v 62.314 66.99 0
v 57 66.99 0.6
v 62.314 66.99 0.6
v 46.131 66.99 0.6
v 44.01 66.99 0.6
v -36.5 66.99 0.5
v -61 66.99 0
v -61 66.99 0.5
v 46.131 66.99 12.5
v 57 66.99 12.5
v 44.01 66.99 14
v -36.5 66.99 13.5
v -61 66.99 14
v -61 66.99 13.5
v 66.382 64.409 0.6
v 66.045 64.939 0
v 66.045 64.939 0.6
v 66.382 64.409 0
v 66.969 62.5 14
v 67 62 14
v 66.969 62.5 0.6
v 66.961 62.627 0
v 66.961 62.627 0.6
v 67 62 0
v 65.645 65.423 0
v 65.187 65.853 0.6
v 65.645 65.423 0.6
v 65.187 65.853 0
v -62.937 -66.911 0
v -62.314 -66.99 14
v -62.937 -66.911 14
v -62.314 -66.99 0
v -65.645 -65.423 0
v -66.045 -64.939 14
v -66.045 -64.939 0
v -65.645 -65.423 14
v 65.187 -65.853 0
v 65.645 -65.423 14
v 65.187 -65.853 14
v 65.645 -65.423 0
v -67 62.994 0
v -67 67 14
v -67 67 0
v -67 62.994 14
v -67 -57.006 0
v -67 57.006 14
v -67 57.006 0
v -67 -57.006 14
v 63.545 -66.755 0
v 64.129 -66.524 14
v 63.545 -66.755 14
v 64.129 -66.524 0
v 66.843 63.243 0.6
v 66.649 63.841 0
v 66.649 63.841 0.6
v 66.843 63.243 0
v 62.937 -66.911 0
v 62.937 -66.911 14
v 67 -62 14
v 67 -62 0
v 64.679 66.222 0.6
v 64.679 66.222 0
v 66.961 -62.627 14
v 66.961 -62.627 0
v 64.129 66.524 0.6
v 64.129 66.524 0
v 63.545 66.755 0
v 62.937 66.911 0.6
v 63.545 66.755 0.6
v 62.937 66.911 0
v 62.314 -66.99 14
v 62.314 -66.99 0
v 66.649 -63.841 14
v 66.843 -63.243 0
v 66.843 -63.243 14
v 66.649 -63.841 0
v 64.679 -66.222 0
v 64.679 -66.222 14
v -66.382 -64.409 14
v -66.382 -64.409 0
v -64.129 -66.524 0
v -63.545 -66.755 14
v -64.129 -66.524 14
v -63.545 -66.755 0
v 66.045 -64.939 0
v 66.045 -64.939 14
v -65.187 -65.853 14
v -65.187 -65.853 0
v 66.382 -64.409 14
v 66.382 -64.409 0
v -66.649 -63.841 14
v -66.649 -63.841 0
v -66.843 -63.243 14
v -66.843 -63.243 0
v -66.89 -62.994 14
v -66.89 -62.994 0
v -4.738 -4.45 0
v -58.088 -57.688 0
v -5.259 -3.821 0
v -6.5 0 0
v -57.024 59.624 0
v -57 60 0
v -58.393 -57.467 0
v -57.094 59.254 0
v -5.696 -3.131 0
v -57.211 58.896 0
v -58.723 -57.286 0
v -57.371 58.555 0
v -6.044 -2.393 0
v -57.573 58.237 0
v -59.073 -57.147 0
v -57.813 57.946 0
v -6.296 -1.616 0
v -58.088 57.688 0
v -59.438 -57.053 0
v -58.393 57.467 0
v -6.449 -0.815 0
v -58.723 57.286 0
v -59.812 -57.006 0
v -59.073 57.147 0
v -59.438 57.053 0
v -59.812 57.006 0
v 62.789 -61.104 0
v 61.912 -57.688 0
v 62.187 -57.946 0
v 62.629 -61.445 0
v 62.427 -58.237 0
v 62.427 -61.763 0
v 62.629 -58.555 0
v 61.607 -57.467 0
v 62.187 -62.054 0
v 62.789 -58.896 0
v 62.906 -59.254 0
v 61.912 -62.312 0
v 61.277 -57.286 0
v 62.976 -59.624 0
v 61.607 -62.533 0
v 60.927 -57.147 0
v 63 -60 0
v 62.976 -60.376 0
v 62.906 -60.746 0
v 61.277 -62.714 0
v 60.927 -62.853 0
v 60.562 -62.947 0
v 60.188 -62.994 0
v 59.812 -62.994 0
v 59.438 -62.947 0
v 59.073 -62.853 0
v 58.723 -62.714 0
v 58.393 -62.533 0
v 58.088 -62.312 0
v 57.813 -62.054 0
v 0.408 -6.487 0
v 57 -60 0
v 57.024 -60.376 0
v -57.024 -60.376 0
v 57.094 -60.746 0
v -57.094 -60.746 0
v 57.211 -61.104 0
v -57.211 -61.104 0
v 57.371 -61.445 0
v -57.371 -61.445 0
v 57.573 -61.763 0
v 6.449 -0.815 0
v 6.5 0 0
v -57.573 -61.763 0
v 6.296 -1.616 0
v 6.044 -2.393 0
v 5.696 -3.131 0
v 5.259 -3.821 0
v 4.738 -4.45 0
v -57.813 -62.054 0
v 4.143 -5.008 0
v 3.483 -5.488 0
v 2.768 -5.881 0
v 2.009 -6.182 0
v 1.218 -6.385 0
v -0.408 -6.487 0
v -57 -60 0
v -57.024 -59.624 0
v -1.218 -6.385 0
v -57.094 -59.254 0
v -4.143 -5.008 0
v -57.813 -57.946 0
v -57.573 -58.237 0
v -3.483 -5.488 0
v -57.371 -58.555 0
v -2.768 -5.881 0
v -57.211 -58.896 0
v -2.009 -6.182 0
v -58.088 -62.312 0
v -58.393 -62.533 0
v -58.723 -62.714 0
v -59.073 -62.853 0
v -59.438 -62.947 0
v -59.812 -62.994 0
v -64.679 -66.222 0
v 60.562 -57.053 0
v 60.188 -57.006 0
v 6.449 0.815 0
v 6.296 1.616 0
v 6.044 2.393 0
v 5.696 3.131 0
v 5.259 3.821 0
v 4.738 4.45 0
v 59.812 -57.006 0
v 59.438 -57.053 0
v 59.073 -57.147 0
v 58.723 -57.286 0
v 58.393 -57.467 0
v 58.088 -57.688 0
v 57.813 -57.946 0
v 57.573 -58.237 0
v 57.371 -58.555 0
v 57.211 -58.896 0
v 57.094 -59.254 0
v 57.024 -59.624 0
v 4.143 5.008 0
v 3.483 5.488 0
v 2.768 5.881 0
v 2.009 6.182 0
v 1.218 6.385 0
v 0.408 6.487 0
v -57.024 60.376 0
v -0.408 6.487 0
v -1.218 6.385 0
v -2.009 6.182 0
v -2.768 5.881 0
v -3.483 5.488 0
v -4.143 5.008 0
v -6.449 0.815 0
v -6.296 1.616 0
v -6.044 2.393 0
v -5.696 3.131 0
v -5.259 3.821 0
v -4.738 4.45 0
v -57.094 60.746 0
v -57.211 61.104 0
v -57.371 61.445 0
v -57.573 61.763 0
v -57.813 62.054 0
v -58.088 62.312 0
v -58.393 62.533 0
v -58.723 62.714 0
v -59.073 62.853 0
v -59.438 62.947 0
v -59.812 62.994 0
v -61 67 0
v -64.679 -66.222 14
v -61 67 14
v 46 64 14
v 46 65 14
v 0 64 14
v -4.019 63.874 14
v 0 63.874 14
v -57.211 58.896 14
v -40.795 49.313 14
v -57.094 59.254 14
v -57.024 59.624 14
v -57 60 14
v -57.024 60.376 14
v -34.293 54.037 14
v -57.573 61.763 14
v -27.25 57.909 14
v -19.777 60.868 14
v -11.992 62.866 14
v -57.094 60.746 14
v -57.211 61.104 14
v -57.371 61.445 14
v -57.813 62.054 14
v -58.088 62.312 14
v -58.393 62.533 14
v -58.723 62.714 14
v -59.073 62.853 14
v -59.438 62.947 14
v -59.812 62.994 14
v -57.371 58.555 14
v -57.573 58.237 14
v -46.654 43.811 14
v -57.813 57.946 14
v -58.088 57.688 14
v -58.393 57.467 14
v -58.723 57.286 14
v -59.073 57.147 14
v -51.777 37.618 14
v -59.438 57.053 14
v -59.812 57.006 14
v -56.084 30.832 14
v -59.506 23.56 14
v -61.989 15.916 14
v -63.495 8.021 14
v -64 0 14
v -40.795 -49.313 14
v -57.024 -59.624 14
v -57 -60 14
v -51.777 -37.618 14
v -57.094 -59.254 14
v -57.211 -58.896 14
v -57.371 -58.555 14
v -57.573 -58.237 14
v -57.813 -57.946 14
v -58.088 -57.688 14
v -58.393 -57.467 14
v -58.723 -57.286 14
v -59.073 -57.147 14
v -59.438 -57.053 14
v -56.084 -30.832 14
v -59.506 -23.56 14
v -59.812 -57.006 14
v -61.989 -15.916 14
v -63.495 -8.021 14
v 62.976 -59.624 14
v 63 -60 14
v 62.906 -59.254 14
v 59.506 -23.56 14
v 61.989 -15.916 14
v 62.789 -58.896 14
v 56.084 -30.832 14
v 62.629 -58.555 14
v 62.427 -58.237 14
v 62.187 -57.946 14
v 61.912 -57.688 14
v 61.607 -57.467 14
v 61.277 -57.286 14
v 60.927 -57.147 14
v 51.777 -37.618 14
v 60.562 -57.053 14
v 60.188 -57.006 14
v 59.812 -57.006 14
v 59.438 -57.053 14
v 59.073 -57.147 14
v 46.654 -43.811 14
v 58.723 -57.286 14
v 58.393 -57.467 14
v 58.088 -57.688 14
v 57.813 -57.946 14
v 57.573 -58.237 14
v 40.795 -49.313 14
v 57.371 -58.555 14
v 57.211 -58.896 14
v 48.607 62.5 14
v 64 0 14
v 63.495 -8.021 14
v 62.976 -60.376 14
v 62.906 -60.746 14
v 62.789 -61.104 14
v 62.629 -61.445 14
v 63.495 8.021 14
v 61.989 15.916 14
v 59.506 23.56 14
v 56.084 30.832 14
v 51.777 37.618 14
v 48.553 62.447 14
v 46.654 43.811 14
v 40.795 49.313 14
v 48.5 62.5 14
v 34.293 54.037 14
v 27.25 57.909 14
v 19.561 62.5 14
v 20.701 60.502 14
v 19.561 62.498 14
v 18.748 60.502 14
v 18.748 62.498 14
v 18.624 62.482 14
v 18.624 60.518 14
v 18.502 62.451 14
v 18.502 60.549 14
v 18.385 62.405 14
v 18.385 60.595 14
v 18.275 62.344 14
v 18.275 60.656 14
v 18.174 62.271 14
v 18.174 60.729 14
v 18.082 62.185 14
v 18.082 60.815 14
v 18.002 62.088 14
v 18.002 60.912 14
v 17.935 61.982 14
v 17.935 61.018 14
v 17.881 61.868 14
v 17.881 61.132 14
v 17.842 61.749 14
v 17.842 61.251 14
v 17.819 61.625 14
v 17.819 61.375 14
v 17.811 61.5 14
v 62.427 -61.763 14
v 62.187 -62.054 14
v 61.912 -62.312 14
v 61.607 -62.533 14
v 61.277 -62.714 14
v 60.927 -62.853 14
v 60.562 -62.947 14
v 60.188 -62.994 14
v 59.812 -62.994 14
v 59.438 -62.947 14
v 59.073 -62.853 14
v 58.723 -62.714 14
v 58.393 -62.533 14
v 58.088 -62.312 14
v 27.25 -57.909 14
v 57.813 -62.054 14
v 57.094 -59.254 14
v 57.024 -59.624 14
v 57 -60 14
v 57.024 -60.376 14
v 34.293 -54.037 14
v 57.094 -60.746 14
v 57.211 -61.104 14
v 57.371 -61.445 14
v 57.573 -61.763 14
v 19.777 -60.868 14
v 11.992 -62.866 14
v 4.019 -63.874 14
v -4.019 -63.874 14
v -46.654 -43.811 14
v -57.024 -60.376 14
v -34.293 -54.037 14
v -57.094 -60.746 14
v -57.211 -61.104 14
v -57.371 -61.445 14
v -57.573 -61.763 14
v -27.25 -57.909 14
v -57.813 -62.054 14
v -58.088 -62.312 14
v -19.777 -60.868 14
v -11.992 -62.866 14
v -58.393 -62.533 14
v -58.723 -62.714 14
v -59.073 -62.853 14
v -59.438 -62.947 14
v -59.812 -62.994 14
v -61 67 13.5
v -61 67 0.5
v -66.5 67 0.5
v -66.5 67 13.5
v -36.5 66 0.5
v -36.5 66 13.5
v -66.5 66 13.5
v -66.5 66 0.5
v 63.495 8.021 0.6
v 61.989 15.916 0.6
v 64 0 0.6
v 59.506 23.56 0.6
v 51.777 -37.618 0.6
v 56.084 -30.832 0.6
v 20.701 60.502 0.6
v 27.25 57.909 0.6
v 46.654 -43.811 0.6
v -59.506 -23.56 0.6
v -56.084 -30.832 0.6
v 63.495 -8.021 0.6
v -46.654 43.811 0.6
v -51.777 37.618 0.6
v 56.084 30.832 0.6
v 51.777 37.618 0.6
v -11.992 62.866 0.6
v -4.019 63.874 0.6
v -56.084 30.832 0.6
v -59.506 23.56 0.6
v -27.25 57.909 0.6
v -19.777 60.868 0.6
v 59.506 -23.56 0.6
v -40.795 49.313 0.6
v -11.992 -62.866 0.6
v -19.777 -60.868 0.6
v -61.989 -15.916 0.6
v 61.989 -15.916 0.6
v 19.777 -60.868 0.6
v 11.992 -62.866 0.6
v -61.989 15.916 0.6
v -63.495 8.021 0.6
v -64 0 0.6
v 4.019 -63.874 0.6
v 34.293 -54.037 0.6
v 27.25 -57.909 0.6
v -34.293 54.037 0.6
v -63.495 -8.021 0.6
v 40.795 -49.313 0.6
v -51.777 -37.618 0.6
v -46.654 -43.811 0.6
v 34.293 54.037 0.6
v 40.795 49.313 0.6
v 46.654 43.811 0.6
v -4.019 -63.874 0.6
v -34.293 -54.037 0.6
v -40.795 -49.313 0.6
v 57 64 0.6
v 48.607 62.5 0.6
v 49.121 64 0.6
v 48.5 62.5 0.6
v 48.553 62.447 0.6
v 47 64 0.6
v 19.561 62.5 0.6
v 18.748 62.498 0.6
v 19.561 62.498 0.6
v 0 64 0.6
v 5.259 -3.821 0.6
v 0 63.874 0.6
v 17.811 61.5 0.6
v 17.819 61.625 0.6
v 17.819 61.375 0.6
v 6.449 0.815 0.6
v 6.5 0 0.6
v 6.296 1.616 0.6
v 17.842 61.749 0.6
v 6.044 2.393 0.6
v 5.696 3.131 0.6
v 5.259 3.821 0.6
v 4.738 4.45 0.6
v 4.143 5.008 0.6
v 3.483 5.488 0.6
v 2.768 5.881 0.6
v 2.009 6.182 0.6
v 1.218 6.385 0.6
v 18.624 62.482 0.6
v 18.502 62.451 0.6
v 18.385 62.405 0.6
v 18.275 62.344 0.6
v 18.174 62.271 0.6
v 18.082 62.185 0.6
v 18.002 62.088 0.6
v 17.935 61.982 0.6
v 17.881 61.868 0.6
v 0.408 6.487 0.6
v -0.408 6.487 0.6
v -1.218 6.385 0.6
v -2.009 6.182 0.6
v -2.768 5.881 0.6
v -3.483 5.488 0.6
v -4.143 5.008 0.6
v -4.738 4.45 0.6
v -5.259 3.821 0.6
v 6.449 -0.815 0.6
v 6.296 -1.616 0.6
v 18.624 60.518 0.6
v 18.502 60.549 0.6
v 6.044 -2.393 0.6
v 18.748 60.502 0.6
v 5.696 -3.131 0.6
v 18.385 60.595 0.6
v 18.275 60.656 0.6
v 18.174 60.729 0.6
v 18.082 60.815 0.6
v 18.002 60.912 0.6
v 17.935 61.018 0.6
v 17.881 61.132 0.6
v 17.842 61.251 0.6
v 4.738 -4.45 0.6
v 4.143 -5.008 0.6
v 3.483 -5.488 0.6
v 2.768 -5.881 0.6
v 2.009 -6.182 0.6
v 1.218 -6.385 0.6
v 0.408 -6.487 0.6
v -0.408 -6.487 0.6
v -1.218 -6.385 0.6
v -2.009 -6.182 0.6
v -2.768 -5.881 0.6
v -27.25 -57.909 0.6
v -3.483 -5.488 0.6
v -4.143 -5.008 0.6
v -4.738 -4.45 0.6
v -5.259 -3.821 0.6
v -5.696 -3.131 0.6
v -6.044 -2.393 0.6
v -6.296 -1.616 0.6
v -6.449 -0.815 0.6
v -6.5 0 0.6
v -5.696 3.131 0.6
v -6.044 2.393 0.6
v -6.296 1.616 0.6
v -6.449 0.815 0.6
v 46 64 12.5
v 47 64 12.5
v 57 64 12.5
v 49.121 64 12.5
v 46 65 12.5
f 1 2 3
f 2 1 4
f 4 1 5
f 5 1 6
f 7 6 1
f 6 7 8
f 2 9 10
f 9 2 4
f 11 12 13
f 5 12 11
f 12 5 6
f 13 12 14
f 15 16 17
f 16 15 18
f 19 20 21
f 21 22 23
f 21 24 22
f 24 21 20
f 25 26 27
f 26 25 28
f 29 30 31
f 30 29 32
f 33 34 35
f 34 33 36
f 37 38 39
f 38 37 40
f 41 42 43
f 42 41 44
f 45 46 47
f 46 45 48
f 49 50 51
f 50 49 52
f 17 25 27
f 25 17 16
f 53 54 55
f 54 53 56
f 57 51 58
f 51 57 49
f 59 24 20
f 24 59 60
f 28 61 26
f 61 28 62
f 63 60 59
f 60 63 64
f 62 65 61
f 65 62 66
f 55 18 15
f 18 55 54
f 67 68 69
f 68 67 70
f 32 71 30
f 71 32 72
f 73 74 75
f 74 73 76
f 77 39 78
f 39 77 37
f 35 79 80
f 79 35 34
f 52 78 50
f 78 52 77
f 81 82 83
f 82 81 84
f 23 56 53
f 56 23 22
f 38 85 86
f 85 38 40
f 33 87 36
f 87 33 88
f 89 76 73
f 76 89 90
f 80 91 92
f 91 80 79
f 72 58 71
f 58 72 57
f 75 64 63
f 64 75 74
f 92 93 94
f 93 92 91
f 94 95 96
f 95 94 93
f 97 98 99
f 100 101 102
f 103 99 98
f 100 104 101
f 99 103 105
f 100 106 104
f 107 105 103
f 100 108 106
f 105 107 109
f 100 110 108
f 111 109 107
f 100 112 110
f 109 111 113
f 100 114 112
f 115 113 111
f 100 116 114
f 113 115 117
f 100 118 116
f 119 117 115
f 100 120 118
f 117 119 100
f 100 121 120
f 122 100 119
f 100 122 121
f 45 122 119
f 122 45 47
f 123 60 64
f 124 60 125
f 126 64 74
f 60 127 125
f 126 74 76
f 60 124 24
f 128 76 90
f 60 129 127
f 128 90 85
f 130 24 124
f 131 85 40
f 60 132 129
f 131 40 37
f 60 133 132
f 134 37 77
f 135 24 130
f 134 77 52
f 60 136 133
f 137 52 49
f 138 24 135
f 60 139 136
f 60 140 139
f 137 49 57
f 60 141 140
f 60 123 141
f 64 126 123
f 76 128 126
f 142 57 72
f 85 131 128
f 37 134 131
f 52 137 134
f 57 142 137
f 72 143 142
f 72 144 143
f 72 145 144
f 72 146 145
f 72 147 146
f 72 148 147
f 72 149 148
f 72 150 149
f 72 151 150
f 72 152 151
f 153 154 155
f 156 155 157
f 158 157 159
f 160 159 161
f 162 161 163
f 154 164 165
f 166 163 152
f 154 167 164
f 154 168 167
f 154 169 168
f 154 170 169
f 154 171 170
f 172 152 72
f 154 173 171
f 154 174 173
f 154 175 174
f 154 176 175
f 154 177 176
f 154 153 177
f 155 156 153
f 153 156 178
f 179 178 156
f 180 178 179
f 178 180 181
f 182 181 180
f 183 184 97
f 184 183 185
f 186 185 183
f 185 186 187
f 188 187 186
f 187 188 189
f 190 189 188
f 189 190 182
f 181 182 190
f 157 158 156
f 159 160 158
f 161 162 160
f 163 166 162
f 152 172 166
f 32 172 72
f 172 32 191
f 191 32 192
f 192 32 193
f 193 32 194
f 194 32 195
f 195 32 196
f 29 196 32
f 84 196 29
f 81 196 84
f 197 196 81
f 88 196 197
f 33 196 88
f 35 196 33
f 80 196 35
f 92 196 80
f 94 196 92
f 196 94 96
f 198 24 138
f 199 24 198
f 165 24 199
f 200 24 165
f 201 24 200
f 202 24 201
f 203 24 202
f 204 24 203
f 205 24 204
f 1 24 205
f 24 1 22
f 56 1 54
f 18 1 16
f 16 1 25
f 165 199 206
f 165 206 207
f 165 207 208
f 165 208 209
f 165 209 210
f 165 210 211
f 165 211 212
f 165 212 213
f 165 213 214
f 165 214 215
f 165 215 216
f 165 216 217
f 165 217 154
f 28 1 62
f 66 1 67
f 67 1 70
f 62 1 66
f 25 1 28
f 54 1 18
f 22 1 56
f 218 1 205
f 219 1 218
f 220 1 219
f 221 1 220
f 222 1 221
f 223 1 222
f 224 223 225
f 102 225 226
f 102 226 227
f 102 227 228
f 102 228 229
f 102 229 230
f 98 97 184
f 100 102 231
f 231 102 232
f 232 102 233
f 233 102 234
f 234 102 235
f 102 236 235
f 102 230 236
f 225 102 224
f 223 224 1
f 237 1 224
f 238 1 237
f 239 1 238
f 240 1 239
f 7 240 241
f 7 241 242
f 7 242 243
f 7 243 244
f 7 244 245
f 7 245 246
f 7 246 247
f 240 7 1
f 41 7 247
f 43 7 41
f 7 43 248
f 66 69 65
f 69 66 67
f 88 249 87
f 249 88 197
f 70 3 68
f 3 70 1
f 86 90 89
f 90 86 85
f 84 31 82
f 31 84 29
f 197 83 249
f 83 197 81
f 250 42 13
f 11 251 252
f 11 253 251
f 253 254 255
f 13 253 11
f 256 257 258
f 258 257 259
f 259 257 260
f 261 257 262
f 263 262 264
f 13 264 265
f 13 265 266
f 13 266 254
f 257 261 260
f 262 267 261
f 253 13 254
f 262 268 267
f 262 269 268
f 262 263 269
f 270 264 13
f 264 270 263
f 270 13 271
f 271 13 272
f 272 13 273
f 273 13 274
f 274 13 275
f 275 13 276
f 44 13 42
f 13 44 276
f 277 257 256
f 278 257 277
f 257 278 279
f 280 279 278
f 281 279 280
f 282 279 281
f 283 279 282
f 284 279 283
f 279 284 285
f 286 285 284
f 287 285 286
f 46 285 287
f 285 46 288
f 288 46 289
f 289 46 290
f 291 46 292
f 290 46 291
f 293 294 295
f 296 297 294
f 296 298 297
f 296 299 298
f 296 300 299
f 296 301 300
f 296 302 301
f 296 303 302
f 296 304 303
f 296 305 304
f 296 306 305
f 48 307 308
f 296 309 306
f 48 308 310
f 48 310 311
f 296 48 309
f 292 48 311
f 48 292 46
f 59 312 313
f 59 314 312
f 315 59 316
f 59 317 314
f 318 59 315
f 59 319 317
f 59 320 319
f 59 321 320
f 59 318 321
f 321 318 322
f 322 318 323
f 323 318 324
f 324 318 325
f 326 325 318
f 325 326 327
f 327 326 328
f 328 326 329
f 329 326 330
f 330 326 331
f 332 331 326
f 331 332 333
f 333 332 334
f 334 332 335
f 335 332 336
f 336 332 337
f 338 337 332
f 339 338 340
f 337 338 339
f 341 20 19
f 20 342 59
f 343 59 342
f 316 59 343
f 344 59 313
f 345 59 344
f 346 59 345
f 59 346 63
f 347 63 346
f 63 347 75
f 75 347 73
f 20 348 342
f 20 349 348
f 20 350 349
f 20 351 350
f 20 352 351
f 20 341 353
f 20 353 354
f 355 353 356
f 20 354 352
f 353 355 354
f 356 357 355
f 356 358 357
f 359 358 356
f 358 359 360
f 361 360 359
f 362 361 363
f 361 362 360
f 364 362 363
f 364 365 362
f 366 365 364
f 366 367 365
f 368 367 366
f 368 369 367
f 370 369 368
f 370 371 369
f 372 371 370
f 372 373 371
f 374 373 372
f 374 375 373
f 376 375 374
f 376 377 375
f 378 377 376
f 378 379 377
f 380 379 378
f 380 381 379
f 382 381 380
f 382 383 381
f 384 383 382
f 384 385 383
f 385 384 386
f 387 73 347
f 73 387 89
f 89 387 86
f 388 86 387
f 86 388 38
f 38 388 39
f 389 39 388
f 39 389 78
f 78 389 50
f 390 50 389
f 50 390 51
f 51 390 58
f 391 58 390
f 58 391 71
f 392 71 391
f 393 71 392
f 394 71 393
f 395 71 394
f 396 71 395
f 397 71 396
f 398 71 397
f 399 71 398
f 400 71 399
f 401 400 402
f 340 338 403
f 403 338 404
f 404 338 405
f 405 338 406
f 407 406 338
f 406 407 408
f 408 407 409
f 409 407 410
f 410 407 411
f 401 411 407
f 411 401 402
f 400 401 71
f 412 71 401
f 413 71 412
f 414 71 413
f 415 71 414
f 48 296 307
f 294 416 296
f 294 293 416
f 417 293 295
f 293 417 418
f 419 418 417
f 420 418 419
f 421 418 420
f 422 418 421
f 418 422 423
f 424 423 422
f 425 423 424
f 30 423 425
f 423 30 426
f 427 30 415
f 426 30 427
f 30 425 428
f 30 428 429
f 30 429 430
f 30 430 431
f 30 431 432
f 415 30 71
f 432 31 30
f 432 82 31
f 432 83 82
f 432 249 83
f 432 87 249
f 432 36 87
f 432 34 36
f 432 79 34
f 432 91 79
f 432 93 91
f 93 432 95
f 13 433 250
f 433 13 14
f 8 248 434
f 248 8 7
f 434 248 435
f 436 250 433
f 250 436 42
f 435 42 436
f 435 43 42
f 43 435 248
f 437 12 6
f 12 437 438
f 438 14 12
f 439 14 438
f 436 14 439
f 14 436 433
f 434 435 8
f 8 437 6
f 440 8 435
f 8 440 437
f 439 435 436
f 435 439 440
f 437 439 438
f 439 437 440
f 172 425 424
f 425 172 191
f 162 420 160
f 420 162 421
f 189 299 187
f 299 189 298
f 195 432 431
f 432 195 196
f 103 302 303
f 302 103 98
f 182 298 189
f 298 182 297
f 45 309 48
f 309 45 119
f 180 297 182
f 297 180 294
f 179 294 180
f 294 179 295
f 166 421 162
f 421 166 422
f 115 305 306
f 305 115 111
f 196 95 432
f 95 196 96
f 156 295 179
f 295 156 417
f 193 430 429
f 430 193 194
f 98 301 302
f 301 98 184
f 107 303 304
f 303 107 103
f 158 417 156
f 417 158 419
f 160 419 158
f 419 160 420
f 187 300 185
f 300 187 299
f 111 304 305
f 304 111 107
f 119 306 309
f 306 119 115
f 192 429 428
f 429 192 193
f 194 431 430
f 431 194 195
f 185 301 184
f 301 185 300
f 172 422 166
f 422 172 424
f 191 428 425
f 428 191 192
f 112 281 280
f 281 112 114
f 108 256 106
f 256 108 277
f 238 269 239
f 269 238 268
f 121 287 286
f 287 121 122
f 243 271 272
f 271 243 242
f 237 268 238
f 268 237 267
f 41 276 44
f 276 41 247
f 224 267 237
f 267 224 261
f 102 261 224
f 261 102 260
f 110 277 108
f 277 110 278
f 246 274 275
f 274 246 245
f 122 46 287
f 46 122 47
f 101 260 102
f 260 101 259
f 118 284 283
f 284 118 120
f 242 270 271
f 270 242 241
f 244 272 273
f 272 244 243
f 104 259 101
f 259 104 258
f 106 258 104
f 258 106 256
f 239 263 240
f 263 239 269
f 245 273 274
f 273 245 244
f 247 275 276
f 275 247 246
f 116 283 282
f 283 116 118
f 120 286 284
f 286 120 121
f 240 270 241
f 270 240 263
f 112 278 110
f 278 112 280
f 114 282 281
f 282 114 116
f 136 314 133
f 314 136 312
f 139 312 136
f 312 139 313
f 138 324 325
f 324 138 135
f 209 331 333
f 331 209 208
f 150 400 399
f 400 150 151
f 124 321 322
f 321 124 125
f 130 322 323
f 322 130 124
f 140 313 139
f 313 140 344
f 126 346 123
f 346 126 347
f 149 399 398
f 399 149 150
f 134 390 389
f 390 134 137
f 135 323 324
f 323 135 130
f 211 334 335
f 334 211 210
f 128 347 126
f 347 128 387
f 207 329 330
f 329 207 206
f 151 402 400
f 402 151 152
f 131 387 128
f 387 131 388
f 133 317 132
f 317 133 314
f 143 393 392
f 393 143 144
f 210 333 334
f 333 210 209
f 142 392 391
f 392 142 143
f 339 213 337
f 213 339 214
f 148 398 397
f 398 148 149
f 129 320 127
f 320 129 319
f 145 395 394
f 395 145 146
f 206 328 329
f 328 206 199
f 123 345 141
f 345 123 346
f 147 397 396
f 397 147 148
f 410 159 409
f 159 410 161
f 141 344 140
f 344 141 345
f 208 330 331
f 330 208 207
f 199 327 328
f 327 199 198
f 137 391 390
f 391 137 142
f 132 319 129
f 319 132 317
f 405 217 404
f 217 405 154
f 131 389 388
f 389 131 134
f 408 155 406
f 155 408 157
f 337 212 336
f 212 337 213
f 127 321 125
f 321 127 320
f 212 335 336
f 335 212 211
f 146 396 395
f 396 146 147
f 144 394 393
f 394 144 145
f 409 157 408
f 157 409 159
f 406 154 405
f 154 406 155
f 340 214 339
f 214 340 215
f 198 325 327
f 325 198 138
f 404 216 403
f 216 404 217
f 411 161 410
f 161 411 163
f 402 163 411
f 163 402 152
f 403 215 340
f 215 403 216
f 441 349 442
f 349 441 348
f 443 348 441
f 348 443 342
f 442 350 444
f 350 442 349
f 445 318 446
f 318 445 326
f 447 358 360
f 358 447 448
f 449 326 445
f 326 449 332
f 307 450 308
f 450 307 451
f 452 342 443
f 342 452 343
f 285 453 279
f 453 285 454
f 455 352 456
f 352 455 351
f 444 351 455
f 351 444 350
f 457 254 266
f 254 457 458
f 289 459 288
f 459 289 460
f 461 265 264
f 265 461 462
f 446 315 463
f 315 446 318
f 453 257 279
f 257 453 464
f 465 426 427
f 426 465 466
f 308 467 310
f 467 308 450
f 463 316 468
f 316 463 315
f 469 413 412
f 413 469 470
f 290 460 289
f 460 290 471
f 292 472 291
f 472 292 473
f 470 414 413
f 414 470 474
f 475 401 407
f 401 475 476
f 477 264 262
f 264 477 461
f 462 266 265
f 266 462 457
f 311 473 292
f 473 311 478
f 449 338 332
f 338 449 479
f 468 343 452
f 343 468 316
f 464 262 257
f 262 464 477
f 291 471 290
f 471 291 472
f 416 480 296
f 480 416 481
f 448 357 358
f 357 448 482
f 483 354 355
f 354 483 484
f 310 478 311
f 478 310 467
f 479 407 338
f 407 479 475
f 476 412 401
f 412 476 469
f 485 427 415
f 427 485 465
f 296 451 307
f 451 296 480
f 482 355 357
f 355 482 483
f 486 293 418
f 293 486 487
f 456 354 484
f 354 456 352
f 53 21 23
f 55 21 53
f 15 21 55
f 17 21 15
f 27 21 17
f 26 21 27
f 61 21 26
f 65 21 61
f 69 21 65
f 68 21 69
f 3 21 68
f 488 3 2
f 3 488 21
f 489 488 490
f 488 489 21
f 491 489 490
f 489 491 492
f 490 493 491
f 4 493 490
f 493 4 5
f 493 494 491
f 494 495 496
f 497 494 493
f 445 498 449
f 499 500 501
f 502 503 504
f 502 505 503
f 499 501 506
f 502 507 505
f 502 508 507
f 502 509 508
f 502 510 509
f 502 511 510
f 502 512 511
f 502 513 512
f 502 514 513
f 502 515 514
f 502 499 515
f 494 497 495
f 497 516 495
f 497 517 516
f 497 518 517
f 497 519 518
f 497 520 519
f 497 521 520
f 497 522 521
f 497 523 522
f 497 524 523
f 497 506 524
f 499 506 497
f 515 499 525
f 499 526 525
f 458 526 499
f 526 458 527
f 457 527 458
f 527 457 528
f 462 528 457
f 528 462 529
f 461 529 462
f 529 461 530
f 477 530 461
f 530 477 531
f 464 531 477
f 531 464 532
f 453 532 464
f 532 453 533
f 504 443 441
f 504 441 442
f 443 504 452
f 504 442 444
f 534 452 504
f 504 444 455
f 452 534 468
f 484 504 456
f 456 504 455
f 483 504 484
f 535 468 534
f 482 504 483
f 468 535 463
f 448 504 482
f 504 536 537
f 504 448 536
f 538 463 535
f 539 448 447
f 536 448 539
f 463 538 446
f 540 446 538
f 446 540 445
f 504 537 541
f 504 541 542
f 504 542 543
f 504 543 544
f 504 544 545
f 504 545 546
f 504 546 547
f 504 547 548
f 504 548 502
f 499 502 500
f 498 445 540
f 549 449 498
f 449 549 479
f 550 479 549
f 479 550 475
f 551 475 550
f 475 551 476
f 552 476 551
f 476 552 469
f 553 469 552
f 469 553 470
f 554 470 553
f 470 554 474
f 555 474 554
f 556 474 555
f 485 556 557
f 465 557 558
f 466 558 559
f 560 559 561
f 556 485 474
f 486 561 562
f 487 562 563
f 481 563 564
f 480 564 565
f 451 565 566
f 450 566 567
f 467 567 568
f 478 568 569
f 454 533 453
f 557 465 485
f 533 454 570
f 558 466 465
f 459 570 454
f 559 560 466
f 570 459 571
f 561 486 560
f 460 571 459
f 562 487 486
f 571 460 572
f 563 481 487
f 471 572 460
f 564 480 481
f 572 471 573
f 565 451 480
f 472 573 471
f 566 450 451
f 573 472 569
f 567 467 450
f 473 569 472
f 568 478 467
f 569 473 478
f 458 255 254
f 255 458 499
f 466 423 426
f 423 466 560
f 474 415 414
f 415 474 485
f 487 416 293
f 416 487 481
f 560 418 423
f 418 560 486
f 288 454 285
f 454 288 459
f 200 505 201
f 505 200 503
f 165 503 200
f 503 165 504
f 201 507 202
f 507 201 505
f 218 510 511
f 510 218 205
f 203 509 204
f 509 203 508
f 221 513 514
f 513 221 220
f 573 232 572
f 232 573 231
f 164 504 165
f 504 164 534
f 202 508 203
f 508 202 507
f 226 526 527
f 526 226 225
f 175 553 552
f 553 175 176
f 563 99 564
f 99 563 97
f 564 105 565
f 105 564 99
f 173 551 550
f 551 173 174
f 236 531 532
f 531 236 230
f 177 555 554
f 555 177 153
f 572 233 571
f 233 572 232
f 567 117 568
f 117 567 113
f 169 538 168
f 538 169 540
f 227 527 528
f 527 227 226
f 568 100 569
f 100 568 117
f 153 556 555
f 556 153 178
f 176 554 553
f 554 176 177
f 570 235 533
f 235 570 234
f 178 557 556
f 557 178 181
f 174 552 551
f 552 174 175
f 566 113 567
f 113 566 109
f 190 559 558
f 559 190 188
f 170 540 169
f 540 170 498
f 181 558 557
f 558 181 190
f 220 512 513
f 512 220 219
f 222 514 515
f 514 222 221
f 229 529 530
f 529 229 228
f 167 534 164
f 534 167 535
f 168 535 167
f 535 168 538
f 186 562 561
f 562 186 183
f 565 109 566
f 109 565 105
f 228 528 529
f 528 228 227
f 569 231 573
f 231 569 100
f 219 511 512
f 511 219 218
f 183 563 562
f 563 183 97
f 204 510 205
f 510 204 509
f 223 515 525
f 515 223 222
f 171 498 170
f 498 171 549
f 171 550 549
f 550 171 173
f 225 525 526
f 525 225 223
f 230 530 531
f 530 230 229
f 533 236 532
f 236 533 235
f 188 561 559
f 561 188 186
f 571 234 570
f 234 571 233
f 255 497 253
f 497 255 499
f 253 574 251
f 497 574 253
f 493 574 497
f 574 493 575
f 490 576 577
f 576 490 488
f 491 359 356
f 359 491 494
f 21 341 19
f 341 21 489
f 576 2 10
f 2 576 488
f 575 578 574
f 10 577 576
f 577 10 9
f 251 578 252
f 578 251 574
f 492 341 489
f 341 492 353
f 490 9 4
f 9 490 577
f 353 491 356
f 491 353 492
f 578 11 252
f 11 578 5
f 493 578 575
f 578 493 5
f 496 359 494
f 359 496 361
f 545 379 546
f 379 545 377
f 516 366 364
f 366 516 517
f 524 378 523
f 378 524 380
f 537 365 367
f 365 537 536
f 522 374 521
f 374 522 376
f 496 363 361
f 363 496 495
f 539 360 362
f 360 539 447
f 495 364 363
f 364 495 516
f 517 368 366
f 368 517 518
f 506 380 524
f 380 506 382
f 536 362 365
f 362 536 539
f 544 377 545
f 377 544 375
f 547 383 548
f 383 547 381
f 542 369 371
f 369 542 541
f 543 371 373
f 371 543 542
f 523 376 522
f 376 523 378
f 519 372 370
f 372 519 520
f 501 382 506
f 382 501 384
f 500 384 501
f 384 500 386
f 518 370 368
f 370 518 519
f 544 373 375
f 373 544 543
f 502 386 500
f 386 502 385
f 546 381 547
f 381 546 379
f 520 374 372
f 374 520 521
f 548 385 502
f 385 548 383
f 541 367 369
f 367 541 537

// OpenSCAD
$fn = 50;


union() {
	difference() {
		union() {
			translate(v = [0, 0, 0]) {
				rotate(a = [0, 0, 0]) {
					hull() {
						translate(v = [-62.0000000000, 62.0000000000, 0]) {
							rotate(a = [0, 0, 0]) {
								translate(v = [0, 0, 0]) {
									rotate(a = [0, 0, 0]) {
										cylinder(h = 14, r = 5);
									}
								}
							}
						}
						translate(v = [62.0000000000, 62.0000000000, 0]) {
							rotate(a = [0, 0, 0]) {
								translate(v = [0, 0, 0]) {
									rotate(a = [0, 0, 0]) {
										cylinder(h = 14, r = 5);
									}
								}
							}
						}
						translate(v = [-62.0000000000, -62.0000000000, 0]) {
							rotate(a = [0, 0, 0]) {
								translate(v = [0, 0, 0]) {
									rotate(a = [0, 0, 0]) {
										cylinder(h = 14, r = 5);
									}
								}
							}
						}
						translate(v = [62.0000000000, -62.0000000000, 0]) {
							rotate(a = [0, 0, 0]) {
								translate(v = [0, 0, 0]) {
									rotate(a = [0, 0, 0]) {
										cylinder(h = 14, r = 5);
									}
								}
							}
						}
					}
				}
			}
			translate(v = [-67.0000000000, 61.0000000000, 0]) {
				rotate(a = [0, 0, 0]) {
					cube(size = [6, 6, 14]);
				}
			}
		}
		union() {
			translate(v = [-66.5000000000, 66.0000000000, 0.5000000000]) {
				rotate(a = [0, 0, 0]) {
					cube(size = [30, 1, 13.0000000000]);
				}
			}
			translate(v = [-67.5000000000, -60.0000000000, -125]) {
				rotate(a = [0, 0, 0]) {
					hull() {
						translate(v = [7.5000000000, 0, 0]) {
							rotate(a = [0, 0, 0]) {
								translate(v = [0, 0, 0]) {
									rotate(a = [0, 0, 0]) {
										cylinder(h = 250, r = 3.0000000000);
									}
								}
							}
						}
						translate(v = [-7.5000000000, 0, 0]) {
							rotate(a = [0, 0, 0]) {
								translate(v = [0, 0, 0]) {
									rotate(a = [0, 0, 0]) {
										cylinder(h = 250, r = 3.0000000000);
									}
								}
							}
						}
					}
				}
			}
			translate(v = [-67.5000000000, 60.0000000000, -125]) {
				rotate(a = [0, 0, 0]) {
					hull() {
						translate(v = [7.5000000000, 0, 0]) {
							rotate(a = [0, 0, 0]) {
								translate(v = [0, 0, 0]) {
									rotate(a = [0, 0, 0]) {
										cylinder(h = 250, r = 3.0000000000);
									}
								}
							}
						}
						translate(v = [-7.5000000000, 0, 0]) {
							rotate(a = [0, 0, 0]) {
								translate(v = [0, 0, 0]) {
									rotate(a = [0, 0, 0]) {
										cylinder(h = 250, r = 3.0000000000);
									}
								}
							}
						}
					}
				}
			}
			translate(v = [60.0000000000, -60.0000000000, -125.0000000000]) {
				rotate(a = [0, 0, 0]) {
					cylinder(h = 250, r = 3.0000000000);
				}
			}
			translate(v = [0, 0, 0.6000000000]) {
				rotate(a = [0, 0, 0]) {
					cylinder(h = 16.4000000000, r = 64.0000000000);
				}
			}
			translate(v = [0, 0, -7.0000000000]) {
				rotate(a = [0, 0, 0]) {
					cylinder(h = 14, r = 6.5000000000);
				}
			}
			translate(v = [0.0000000000, 62.5000000000, 0.6000000000]) {
				rotate(a = [0, 0, 0]) {
					cube(size = [67.0000000000, 1.5000000000, 16.4000000000]);
				}
			}
			translate(v = [57.0000000000, 62.5000000000, 0.6000000000]) {
				rotate(a = [0, 0, 0]) {
					cube(size = [10, 4.5000000000, 16.4000000000]);
				}
			}
			translate(v = [46.0000000000, 62.5000000000, 12.5000000000]) {
				rotate(a = [0, 0, 0]) {
					cube(size = [21, 4.5000000000, 1.5000000000]);
				}
			}
			translate(v = [43.2500000000, 67.7500000000, 0.6000000000]) {
				rotate(a = [0, 0, -45]) {
					cube(size = [7.5000000000, 1.5000000000, 16.4000000000]);
				}
			}
			translate(v = [12.0610000000, 60.5000000000, 0.6000000000]) {
				rotate(a = [0, 0, 0]) {
					cube(size = [7.5000000000, 2, 13.4000000000]);
				}
			}
		}
	}
	union() {
		translate(v = [21.3110000000, 61.5000000000, 0]) {
			rotate(a = [0, 0, 0]) {
				hull() {
					translate(v = [2.5000000000, 0, 0]) {
						rotate(a = [0, 0, 0]) {
							translate(v = [0, 0, 0]) {
								rotate(a = [0, 0, 0]) {
									cylinder(h = 14, r = 1.0000000000);
								}
							}
						}
					}
					translate(v = [-2.5000000000, 0, 0]) {
						rotate(a = [0, 0, 0]) {
							translate(v = [0, 0, 0]) {
								rotate(a = [0, 0, 0]) {
									cylinder(h = 14, r = 1.0000000000);
								}
							}
						}
					}
				}
			}
		}
	}
}
